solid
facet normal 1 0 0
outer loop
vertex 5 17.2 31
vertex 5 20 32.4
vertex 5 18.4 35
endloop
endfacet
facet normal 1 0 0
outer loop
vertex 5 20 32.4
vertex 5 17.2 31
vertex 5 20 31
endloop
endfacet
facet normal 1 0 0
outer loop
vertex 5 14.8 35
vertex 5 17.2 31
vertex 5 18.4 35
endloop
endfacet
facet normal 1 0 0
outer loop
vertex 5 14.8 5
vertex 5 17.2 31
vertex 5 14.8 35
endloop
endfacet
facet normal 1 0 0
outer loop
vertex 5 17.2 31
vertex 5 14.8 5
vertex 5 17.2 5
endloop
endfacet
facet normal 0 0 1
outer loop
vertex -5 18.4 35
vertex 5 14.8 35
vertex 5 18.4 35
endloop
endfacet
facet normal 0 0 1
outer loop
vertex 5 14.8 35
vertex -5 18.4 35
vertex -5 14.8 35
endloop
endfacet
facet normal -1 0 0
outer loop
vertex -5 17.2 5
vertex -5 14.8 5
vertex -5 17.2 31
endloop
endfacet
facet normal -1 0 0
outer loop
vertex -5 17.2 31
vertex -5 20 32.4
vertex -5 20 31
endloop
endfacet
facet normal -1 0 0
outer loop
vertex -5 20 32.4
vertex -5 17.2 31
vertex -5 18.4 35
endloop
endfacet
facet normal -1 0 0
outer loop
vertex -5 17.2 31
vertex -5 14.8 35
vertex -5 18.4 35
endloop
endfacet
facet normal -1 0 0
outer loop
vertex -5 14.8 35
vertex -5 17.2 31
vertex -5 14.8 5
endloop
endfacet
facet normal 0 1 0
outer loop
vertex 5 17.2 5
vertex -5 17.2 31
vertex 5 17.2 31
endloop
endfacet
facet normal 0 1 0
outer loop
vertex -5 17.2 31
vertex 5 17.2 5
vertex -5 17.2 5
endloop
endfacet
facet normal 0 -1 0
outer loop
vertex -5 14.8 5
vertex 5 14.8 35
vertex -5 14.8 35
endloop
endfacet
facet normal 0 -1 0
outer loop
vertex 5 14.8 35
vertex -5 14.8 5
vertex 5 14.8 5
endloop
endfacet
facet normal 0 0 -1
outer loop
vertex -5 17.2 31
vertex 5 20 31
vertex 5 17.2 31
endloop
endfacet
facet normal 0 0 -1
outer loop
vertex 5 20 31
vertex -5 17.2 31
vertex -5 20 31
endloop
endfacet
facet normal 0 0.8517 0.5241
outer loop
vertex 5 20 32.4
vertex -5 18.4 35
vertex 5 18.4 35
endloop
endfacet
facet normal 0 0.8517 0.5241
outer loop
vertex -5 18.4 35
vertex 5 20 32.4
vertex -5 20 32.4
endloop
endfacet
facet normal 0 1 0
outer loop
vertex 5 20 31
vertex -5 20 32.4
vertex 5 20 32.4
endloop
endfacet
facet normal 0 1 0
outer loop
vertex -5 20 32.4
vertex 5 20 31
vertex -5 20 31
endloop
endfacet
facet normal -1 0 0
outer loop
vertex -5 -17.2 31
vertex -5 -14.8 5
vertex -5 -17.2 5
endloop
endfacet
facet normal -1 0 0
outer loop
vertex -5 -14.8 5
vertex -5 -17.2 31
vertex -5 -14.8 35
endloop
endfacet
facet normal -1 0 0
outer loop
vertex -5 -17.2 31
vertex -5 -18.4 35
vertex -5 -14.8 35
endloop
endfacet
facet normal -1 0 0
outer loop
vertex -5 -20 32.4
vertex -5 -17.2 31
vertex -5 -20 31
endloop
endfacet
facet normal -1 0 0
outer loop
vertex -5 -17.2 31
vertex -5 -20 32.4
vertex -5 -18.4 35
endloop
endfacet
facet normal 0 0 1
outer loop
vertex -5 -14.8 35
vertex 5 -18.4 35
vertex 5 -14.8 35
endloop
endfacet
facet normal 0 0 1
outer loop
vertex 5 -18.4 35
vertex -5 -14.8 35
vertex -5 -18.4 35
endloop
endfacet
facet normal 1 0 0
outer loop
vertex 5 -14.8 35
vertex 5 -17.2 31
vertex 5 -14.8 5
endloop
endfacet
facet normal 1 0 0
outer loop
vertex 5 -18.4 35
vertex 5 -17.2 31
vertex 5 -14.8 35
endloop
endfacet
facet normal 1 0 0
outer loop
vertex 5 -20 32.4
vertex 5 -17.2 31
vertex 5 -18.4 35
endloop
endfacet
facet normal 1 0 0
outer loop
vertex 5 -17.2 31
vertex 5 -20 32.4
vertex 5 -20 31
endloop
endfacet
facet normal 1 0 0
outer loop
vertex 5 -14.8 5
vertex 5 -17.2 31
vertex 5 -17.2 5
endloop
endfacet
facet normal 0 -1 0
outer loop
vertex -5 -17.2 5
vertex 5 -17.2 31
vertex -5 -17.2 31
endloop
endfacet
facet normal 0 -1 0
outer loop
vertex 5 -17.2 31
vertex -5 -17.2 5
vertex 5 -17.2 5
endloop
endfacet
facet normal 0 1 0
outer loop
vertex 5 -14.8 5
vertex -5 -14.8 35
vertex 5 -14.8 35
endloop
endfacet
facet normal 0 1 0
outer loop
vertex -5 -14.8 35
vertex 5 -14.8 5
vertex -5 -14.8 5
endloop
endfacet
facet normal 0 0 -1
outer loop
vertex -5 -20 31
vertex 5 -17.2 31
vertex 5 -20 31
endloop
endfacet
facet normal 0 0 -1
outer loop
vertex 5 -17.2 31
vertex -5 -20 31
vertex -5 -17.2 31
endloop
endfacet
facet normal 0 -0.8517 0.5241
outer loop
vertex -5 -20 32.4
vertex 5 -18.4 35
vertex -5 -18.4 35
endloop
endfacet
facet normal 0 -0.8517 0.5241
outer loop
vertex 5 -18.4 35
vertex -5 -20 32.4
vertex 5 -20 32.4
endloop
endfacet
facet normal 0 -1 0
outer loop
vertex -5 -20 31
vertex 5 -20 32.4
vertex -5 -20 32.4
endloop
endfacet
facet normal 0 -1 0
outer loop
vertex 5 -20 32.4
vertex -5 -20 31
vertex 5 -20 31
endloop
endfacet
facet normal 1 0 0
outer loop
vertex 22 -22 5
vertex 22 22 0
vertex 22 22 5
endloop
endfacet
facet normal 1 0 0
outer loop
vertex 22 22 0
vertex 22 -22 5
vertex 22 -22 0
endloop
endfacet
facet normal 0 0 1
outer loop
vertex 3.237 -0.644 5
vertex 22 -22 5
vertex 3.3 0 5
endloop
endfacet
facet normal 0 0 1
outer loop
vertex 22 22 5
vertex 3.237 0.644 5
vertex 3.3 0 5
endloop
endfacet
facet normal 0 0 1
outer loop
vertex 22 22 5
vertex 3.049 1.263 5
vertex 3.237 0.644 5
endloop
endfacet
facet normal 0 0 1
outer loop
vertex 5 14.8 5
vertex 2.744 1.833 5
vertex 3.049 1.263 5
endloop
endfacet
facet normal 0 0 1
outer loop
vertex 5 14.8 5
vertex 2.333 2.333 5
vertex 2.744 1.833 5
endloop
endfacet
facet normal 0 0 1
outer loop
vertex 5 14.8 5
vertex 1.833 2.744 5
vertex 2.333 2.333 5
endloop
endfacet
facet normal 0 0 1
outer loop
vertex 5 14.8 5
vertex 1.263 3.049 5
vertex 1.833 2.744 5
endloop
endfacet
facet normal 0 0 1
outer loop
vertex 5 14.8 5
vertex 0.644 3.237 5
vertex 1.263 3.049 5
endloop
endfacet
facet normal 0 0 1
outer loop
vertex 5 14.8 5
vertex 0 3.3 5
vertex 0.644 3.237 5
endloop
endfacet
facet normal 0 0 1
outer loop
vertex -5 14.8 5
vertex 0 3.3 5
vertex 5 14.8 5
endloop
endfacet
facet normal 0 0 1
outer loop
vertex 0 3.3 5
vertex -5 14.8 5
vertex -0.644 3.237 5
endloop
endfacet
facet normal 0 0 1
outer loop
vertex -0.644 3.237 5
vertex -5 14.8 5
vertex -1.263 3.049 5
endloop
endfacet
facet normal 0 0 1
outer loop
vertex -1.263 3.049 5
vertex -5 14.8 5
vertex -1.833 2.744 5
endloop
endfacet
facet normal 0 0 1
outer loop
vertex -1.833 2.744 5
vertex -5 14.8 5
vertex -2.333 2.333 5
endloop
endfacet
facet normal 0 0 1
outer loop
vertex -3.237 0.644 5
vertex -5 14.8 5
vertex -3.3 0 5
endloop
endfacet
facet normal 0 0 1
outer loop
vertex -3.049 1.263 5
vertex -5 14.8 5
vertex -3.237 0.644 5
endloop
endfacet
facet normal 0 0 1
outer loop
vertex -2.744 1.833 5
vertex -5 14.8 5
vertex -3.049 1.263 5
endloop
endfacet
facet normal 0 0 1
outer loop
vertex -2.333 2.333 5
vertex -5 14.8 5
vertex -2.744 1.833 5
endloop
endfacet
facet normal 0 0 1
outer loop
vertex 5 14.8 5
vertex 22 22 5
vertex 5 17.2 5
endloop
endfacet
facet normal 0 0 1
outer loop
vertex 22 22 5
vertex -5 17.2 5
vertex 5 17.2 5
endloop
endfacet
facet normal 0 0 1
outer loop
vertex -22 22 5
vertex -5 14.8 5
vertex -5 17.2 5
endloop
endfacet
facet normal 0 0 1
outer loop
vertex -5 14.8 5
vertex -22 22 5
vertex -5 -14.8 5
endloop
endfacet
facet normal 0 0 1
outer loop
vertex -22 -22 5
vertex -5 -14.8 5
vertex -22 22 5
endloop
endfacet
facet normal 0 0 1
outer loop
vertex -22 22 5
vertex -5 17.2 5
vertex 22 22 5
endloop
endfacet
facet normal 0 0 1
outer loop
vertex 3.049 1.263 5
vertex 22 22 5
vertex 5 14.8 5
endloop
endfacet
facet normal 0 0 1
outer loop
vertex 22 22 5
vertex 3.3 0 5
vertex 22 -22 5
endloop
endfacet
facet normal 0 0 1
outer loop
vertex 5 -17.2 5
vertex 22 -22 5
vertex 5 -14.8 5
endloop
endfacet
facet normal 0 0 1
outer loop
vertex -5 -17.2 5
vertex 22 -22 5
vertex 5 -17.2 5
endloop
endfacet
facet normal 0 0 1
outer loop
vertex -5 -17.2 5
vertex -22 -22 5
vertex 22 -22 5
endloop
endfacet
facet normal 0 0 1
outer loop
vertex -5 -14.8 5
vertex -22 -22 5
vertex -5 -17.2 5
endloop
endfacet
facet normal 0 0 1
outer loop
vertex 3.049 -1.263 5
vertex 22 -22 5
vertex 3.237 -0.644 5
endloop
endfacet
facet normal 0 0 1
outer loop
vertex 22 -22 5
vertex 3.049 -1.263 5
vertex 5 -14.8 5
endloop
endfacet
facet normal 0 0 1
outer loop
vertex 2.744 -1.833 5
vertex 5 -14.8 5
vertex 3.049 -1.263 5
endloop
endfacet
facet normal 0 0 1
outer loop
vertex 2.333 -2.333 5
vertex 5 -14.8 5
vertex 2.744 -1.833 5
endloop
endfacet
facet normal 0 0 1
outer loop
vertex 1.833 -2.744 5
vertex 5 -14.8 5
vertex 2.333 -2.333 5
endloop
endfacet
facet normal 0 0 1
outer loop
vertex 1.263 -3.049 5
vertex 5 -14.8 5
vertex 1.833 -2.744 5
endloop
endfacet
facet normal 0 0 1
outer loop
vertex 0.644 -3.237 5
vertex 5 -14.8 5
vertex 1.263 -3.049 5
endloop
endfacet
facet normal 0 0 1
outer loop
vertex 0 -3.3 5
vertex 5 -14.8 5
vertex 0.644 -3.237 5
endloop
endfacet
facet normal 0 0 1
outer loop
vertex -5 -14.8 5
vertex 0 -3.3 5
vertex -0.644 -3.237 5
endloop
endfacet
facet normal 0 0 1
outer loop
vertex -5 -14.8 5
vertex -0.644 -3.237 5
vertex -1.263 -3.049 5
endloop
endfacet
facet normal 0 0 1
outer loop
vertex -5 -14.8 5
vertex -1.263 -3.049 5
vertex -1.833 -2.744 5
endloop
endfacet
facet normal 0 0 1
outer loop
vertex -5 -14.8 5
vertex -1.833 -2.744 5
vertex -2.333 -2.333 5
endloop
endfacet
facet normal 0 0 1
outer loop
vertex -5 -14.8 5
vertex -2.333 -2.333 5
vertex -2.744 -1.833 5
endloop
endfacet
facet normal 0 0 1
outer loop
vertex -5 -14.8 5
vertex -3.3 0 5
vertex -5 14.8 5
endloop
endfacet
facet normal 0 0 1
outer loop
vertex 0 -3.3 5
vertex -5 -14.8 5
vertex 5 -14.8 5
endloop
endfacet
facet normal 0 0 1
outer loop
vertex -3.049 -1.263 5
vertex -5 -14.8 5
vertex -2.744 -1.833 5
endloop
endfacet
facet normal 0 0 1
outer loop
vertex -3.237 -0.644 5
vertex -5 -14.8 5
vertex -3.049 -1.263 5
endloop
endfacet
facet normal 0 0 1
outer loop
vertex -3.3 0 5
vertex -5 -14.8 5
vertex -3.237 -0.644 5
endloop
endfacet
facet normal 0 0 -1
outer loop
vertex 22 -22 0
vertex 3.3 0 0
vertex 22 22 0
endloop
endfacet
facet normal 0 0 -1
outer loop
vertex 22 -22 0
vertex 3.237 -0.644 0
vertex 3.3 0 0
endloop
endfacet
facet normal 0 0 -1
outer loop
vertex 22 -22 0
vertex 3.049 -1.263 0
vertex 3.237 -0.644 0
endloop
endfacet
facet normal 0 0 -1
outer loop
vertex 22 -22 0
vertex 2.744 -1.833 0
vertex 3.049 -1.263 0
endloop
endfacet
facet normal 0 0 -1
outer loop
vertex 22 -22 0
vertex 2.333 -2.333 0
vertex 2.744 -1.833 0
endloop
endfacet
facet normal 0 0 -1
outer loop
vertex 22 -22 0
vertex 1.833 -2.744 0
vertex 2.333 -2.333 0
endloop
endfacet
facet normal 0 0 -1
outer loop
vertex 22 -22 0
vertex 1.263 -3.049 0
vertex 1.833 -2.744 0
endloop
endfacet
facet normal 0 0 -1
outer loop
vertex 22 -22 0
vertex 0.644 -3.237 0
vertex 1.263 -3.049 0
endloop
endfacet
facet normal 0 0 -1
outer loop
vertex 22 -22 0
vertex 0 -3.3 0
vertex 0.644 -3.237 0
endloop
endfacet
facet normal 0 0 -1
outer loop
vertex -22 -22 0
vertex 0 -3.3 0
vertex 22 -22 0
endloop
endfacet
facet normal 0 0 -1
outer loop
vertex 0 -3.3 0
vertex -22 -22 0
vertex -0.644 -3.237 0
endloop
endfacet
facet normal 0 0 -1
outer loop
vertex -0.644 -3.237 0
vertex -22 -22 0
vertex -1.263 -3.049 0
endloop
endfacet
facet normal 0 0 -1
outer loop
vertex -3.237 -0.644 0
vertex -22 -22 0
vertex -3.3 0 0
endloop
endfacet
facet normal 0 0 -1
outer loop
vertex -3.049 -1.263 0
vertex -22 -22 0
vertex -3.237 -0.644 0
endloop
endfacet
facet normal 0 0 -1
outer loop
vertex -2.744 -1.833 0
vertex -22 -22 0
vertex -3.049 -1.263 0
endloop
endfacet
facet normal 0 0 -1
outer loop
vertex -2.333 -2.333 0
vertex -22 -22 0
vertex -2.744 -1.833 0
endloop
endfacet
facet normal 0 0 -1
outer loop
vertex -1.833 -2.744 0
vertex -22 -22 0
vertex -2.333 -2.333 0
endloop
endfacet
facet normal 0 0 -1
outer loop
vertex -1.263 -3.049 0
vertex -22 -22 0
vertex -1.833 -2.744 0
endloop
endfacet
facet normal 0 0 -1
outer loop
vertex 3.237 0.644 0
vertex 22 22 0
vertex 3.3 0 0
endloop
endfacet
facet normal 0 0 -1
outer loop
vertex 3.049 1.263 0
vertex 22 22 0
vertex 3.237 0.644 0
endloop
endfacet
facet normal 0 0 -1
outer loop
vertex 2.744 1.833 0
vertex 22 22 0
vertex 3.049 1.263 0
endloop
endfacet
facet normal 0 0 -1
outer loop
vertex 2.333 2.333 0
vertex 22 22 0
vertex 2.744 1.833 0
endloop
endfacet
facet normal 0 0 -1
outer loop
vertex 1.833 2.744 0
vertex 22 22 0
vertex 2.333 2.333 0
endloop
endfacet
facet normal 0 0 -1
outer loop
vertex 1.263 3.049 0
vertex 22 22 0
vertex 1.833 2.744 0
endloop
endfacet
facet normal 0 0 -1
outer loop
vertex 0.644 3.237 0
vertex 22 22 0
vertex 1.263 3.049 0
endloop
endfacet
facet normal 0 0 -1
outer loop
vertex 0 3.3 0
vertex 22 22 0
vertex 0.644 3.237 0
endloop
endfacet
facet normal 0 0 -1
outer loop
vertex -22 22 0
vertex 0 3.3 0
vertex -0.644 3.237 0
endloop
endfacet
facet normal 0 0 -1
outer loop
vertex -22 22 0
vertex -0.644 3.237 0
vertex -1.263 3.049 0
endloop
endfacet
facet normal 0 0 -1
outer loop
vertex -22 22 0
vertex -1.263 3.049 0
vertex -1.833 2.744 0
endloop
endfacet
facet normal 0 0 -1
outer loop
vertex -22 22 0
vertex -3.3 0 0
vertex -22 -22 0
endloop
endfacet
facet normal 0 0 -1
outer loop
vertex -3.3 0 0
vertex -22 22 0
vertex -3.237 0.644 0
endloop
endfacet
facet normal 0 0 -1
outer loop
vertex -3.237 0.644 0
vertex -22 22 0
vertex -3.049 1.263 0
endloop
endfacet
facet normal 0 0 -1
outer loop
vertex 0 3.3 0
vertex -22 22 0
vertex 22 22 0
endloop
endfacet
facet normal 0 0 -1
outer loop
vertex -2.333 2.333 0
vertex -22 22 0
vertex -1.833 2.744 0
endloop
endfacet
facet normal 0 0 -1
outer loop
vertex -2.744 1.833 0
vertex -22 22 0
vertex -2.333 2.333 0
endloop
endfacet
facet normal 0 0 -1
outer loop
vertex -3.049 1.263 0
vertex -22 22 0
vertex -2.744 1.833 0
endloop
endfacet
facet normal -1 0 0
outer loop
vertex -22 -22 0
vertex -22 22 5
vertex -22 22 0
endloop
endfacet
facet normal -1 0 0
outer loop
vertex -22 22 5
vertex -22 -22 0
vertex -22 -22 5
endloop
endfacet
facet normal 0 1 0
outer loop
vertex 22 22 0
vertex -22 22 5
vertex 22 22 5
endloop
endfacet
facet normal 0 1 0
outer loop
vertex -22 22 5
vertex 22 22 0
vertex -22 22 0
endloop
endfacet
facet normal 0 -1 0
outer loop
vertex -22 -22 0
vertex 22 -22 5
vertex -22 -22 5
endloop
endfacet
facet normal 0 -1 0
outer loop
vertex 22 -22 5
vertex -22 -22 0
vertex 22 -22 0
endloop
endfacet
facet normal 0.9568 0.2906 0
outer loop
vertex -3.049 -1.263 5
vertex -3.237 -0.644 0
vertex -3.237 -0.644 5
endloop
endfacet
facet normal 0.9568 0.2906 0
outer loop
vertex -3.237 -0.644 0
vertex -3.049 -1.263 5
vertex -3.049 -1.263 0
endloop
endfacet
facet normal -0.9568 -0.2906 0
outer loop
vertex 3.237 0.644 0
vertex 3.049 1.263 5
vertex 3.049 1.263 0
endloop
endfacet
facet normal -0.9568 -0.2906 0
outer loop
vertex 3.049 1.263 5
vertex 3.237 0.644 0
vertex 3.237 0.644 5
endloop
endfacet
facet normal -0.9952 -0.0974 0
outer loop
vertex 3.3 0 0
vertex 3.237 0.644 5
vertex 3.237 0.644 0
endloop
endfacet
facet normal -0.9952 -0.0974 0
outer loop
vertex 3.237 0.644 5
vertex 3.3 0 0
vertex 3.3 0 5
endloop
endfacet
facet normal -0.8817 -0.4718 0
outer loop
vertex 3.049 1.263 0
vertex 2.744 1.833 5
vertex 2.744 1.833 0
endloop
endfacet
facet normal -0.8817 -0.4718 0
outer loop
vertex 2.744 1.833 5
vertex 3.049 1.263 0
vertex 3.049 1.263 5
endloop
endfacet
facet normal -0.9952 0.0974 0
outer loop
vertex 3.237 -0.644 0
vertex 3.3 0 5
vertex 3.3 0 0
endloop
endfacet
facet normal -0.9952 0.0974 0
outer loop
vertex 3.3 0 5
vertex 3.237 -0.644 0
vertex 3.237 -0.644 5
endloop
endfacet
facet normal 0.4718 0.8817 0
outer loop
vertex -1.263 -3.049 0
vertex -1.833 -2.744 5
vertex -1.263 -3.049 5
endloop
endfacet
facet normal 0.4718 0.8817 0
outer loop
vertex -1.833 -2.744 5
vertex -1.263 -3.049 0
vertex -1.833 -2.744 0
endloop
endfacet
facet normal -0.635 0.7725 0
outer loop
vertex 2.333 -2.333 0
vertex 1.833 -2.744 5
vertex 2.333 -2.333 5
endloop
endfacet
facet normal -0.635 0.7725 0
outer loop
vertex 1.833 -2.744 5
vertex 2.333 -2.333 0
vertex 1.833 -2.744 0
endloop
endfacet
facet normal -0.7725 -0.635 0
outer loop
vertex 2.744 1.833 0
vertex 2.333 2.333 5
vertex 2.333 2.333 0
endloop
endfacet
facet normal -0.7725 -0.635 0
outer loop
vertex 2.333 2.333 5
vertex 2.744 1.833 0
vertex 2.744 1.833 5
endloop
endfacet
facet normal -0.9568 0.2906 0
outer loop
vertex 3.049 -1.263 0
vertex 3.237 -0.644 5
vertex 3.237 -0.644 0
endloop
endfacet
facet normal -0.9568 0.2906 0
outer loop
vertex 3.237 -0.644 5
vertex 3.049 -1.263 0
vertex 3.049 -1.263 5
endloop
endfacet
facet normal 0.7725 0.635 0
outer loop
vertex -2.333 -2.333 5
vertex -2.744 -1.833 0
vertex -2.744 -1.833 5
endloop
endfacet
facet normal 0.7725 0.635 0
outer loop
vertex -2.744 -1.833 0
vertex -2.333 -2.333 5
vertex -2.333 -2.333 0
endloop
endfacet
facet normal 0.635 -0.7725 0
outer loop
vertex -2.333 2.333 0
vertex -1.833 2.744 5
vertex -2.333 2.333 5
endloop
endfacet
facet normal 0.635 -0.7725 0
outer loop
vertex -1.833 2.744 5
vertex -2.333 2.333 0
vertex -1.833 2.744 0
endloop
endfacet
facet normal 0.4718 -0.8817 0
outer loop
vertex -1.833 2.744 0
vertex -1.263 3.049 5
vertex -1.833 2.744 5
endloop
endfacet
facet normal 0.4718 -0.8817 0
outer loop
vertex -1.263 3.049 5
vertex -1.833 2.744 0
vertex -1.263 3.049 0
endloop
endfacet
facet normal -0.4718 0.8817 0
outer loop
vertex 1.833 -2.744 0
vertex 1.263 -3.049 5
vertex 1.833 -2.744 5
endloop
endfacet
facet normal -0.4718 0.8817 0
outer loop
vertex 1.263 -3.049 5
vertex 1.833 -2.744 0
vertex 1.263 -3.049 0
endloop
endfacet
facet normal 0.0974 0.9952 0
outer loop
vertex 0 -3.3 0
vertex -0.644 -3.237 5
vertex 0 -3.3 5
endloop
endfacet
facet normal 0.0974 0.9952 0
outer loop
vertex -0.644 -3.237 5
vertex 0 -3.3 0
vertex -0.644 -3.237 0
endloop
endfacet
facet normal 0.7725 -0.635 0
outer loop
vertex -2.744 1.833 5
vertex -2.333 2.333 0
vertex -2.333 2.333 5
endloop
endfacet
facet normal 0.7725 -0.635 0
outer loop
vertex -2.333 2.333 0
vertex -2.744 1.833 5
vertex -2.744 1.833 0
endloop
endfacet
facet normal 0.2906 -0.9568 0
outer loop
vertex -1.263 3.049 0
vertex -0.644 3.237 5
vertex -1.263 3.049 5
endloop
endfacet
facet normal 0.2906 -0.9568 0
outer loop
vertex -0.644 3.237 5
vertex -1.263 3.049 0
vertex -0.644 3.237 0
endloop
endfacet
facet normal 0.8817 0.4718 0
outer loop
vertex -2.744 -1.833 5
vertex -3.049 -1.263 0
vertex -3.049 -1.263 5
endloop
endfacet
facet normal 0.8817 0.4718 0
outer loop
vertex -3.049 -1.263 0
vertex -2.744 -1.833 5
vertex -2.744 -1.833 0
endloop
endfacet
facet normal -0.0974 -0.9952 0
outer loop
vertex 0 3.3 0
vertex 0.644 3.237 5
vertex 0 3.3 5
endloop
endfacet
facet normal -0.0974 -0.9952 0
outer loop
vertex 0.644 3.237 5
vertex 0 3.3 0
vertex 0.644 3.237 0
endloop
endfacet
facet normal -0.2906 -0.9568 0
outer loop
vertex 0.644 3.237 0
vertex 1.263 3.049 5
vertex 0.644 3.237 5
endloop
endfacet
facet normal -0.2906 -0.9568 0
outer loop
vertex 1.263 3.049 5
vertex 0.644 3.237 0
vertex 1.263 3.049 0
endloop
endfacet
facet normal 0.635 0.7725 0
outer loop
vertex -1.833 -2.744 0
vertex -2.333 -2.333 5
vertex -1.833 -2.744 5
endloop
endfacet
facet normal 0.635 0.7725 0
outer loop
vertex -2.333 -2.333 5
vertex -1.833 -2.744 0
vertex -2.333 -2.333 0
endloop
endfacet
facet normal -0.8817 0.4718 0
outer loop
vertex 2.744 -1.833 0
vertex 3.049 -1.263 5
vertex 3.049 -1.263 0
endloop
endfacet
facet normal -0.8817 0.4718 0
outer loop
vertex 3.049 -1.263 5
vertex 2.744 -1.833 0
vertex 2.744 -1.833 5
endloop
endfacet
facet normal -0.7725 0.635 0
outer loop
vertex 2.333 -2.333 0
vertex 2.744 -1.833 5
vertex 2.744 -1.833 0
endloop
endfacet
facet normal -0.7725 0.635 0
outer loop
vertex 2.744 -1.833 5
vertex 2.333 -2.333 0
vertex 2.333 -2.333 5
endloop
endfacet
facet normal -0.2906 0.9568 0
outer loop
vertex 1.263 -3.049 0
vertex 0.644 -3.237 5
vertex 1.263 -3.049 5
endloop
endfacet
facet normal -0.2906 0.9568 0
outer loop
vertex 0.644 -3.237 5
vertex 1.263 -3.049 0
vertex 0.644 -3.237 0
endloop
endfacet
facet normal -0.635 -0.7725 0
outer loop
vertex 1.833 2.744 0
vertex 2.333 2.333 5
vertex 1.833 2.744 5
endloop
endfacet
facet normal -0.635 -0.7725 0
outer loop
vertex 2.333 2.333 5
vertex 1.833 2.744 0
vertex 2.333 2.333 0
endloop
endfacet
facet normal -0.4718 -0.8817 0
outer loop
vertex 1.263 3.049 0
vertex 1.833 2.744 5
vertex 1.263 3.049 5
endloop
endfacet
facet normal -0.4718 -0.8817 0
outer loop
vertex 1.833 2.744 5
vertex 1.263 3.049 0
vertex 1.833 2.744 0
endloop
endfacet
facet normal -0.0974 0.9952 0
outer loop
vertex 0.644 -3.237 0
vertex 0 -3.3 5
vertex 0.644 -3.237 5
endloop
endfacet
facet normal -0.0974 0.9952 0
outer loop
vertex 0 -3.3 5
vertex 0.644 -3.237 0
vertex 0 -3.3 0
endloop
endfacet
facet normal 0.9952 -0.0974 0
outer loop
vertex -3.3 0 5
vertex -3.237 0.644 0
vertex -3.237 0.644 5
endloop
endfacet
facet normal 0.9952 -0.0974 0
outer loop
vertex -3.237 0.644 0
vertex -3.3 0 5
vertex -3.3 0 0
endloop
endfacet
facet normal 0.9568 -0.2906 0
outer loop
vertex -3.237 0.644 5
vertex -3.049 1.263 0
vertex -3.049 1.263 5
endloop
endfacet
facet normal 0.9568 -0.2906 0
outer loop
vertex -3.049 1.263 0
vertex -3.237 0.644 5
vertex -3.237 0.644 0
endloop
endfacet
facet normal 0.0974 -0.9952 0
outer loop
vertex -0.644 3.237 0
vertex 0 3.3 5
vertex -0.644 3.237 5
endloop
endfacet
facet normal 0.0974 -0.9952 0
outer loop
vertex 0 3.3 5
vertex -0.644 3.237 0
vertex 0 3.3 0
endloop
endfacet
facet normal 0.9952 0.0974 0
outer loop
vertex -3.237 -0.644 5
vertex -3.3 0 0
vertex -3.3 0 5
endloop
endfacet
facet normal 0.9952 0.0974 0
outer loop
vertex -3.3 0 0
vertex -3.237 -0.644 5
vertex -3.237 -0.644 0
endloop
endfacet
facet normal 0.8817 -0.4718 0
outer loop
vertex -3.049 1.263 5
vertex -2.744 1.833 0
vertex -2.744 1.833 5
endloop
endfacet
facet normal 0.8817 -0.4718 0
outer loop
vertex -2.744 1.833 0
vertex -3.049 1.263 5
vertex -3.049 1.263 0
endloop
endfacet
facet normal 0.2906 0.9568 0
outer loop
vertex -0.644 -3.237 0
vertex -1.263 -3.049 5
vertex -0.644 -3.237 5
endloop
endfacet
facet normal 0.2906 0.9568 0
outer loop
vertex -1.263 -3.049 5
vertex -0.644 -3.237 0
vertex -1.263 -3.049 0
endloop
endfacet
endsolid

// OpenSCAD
$fn = 32;

// ----------------------------------------------------------------------
// Snap-fit latch: 2 arms, 30 mm tall, 3 mm undercut hooks
// ----------------------------------------------------------------------

// --- parameters (mm) ---
base_d = 44;              // base plate depth
base_h = 5;               // base plate thickness
span = 32;                // distance between opposite arms
arm_t = 2.4;              // arm thickness
arm_d = 10;               // arm width
height = 30;              // free arm length
head_len = 3;             // hook reach
head_h = 4;               // hook height
lead = 1.4;               // lead-in ramp thickness
bore_d = 6.6;             // base fixing bore
top_z = 35;               // height of the arm tips above the base

arms = 2;

difference() {
  union() {
    /* base plate, centred on the arm ring */
    translate([-22, -22, 0]) cube([base_d, base_d, base_h]);
    for (a = [0 : 360 / arms : 359]) rotate([0, 0, a]) {
    /* arm, sunk 0.5 mm into the base */
    translate([-arm_d / 2, span / 2 - arm_t / 2, base_h - 0.5]) cube([arm_d, arm_t, height + 0.5]);
    /* hook: a convex hull of a tall inner block and a thin outer lip
       gives a flat undercut below and a lead-in ramp on top */
    hull() {
      translate([-arm_d / 2, span / 2 + arm_t / 2 - 0.6, top_z - head_h]) cube([arm_d, lead + 0.4, head_h]);
      translate([-arm_d / 2, span / 2 + arm_t / 2 - 0.2, top_z - head_h]) cube([arm_d, head_len, lead]);
    }
    }
  }
  translate([0, 0, -2.5]) cylinder(h = base_h + 5, d = bore_d);
}
